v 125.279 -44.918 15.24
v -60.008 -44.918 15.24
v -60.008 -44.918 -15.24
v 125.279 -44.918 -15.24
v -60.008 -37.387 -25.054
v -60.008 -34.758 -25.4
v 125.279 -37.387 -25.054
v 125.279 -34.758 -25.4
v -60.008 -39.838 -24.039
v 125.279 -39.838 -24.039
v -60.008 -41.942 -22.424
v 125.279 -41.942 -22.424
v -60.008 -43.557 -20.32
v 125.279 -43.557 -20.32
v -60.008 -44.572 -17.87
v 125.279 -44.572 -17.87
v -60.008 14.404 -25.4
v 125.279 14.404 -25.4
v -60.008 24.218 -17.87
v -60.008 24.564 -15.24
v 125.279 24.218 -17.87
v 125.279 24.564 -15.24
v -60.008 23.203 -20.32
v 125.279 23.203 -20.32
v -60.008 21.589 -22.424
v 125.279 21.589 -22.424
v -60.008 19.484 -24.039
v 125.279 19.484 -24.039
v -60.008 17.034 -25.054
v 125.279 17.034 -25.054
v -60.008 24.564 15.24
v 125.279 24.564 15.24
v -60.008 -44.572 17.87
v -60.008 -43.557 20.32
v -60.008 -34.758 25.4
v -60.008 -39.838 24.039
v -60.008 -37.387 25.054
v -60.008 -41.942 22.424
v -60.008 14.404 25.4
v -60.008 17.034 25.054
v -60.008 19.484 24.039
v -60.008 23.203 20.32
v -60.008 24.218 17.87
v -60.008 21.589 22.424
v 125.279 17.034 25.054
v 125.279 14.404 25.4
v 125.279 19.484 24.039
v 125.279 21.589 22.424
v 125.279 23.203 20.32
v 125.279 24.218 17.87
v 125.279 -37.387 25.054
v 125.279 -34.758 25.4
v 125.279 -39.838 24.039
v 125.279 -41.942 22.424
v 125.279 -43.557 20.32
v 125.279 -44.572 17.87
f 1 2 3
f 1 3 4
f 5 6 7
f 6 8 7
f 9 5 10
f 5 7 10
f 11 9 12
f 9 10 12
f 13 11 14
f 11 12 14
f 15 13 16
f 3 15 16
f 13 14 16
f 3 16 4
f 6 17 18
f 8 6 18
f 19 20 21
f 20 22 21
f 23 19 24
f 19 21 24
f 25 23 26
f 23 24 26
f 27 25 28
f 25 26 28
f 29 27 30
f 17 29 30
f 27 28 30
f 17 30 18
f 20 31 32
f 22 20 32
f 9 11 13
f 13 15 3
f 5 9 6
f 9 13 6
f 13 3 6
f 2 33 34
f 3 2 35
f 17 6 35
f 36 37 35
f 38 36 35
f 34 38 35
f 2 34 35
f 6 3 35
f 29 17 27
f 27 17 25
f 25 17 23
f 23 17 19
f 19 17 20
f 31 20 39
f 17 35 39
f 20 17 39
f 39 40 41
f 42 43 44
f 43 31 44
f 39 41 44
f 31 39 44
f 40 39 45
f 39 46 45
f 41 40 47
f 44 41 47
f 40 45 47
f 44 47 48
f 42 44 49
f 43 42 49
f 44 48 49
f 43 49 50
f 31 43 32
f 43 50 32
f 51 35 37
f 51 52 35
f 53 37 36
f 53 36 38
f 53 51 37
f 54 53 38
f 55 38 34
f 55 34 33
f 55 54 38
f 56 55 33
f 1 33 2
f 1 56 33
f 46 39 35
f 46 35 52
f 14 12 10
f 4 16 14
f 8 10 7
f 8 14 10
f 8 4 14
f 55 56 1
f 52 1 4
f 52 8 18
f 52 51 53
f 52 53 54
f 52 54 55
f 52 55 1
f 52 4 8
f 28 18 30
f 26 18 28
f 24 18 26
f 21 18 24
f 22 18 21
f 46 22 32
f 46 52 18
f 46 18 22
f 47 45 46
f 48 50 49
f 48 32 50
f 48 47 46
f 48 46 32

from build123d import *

# Parameters (mm, degrees)
F0_W     = 185.286317
F0_H     = 69.482369
F1_DEPTH = 25.4
F2_R     = 10.16


with BuildPart() as f1:
    # F0 (on Top) → F1 (new body, symmetric)
    with BuildSketch(Plane.XY):
        with Locations((32.635657, -10.176711)):
            Rectangle(F0_W, F0_H)
    extrude(amount=F1_DEPTH, both=True)

    # F2
    f2_edges = [f1.edges().sort_by_distance(p)[0] for p in [
        (32.635657, -44.917896, 25.4),
        (32.635657, 24.564473, 25.4),
        (32.635657, -44.917896, -25.4),
        (32.635657, 24.564473, -25.4),
    ]]
    fillet(f2_edges, radius=F2_R)


solid = f1.part
